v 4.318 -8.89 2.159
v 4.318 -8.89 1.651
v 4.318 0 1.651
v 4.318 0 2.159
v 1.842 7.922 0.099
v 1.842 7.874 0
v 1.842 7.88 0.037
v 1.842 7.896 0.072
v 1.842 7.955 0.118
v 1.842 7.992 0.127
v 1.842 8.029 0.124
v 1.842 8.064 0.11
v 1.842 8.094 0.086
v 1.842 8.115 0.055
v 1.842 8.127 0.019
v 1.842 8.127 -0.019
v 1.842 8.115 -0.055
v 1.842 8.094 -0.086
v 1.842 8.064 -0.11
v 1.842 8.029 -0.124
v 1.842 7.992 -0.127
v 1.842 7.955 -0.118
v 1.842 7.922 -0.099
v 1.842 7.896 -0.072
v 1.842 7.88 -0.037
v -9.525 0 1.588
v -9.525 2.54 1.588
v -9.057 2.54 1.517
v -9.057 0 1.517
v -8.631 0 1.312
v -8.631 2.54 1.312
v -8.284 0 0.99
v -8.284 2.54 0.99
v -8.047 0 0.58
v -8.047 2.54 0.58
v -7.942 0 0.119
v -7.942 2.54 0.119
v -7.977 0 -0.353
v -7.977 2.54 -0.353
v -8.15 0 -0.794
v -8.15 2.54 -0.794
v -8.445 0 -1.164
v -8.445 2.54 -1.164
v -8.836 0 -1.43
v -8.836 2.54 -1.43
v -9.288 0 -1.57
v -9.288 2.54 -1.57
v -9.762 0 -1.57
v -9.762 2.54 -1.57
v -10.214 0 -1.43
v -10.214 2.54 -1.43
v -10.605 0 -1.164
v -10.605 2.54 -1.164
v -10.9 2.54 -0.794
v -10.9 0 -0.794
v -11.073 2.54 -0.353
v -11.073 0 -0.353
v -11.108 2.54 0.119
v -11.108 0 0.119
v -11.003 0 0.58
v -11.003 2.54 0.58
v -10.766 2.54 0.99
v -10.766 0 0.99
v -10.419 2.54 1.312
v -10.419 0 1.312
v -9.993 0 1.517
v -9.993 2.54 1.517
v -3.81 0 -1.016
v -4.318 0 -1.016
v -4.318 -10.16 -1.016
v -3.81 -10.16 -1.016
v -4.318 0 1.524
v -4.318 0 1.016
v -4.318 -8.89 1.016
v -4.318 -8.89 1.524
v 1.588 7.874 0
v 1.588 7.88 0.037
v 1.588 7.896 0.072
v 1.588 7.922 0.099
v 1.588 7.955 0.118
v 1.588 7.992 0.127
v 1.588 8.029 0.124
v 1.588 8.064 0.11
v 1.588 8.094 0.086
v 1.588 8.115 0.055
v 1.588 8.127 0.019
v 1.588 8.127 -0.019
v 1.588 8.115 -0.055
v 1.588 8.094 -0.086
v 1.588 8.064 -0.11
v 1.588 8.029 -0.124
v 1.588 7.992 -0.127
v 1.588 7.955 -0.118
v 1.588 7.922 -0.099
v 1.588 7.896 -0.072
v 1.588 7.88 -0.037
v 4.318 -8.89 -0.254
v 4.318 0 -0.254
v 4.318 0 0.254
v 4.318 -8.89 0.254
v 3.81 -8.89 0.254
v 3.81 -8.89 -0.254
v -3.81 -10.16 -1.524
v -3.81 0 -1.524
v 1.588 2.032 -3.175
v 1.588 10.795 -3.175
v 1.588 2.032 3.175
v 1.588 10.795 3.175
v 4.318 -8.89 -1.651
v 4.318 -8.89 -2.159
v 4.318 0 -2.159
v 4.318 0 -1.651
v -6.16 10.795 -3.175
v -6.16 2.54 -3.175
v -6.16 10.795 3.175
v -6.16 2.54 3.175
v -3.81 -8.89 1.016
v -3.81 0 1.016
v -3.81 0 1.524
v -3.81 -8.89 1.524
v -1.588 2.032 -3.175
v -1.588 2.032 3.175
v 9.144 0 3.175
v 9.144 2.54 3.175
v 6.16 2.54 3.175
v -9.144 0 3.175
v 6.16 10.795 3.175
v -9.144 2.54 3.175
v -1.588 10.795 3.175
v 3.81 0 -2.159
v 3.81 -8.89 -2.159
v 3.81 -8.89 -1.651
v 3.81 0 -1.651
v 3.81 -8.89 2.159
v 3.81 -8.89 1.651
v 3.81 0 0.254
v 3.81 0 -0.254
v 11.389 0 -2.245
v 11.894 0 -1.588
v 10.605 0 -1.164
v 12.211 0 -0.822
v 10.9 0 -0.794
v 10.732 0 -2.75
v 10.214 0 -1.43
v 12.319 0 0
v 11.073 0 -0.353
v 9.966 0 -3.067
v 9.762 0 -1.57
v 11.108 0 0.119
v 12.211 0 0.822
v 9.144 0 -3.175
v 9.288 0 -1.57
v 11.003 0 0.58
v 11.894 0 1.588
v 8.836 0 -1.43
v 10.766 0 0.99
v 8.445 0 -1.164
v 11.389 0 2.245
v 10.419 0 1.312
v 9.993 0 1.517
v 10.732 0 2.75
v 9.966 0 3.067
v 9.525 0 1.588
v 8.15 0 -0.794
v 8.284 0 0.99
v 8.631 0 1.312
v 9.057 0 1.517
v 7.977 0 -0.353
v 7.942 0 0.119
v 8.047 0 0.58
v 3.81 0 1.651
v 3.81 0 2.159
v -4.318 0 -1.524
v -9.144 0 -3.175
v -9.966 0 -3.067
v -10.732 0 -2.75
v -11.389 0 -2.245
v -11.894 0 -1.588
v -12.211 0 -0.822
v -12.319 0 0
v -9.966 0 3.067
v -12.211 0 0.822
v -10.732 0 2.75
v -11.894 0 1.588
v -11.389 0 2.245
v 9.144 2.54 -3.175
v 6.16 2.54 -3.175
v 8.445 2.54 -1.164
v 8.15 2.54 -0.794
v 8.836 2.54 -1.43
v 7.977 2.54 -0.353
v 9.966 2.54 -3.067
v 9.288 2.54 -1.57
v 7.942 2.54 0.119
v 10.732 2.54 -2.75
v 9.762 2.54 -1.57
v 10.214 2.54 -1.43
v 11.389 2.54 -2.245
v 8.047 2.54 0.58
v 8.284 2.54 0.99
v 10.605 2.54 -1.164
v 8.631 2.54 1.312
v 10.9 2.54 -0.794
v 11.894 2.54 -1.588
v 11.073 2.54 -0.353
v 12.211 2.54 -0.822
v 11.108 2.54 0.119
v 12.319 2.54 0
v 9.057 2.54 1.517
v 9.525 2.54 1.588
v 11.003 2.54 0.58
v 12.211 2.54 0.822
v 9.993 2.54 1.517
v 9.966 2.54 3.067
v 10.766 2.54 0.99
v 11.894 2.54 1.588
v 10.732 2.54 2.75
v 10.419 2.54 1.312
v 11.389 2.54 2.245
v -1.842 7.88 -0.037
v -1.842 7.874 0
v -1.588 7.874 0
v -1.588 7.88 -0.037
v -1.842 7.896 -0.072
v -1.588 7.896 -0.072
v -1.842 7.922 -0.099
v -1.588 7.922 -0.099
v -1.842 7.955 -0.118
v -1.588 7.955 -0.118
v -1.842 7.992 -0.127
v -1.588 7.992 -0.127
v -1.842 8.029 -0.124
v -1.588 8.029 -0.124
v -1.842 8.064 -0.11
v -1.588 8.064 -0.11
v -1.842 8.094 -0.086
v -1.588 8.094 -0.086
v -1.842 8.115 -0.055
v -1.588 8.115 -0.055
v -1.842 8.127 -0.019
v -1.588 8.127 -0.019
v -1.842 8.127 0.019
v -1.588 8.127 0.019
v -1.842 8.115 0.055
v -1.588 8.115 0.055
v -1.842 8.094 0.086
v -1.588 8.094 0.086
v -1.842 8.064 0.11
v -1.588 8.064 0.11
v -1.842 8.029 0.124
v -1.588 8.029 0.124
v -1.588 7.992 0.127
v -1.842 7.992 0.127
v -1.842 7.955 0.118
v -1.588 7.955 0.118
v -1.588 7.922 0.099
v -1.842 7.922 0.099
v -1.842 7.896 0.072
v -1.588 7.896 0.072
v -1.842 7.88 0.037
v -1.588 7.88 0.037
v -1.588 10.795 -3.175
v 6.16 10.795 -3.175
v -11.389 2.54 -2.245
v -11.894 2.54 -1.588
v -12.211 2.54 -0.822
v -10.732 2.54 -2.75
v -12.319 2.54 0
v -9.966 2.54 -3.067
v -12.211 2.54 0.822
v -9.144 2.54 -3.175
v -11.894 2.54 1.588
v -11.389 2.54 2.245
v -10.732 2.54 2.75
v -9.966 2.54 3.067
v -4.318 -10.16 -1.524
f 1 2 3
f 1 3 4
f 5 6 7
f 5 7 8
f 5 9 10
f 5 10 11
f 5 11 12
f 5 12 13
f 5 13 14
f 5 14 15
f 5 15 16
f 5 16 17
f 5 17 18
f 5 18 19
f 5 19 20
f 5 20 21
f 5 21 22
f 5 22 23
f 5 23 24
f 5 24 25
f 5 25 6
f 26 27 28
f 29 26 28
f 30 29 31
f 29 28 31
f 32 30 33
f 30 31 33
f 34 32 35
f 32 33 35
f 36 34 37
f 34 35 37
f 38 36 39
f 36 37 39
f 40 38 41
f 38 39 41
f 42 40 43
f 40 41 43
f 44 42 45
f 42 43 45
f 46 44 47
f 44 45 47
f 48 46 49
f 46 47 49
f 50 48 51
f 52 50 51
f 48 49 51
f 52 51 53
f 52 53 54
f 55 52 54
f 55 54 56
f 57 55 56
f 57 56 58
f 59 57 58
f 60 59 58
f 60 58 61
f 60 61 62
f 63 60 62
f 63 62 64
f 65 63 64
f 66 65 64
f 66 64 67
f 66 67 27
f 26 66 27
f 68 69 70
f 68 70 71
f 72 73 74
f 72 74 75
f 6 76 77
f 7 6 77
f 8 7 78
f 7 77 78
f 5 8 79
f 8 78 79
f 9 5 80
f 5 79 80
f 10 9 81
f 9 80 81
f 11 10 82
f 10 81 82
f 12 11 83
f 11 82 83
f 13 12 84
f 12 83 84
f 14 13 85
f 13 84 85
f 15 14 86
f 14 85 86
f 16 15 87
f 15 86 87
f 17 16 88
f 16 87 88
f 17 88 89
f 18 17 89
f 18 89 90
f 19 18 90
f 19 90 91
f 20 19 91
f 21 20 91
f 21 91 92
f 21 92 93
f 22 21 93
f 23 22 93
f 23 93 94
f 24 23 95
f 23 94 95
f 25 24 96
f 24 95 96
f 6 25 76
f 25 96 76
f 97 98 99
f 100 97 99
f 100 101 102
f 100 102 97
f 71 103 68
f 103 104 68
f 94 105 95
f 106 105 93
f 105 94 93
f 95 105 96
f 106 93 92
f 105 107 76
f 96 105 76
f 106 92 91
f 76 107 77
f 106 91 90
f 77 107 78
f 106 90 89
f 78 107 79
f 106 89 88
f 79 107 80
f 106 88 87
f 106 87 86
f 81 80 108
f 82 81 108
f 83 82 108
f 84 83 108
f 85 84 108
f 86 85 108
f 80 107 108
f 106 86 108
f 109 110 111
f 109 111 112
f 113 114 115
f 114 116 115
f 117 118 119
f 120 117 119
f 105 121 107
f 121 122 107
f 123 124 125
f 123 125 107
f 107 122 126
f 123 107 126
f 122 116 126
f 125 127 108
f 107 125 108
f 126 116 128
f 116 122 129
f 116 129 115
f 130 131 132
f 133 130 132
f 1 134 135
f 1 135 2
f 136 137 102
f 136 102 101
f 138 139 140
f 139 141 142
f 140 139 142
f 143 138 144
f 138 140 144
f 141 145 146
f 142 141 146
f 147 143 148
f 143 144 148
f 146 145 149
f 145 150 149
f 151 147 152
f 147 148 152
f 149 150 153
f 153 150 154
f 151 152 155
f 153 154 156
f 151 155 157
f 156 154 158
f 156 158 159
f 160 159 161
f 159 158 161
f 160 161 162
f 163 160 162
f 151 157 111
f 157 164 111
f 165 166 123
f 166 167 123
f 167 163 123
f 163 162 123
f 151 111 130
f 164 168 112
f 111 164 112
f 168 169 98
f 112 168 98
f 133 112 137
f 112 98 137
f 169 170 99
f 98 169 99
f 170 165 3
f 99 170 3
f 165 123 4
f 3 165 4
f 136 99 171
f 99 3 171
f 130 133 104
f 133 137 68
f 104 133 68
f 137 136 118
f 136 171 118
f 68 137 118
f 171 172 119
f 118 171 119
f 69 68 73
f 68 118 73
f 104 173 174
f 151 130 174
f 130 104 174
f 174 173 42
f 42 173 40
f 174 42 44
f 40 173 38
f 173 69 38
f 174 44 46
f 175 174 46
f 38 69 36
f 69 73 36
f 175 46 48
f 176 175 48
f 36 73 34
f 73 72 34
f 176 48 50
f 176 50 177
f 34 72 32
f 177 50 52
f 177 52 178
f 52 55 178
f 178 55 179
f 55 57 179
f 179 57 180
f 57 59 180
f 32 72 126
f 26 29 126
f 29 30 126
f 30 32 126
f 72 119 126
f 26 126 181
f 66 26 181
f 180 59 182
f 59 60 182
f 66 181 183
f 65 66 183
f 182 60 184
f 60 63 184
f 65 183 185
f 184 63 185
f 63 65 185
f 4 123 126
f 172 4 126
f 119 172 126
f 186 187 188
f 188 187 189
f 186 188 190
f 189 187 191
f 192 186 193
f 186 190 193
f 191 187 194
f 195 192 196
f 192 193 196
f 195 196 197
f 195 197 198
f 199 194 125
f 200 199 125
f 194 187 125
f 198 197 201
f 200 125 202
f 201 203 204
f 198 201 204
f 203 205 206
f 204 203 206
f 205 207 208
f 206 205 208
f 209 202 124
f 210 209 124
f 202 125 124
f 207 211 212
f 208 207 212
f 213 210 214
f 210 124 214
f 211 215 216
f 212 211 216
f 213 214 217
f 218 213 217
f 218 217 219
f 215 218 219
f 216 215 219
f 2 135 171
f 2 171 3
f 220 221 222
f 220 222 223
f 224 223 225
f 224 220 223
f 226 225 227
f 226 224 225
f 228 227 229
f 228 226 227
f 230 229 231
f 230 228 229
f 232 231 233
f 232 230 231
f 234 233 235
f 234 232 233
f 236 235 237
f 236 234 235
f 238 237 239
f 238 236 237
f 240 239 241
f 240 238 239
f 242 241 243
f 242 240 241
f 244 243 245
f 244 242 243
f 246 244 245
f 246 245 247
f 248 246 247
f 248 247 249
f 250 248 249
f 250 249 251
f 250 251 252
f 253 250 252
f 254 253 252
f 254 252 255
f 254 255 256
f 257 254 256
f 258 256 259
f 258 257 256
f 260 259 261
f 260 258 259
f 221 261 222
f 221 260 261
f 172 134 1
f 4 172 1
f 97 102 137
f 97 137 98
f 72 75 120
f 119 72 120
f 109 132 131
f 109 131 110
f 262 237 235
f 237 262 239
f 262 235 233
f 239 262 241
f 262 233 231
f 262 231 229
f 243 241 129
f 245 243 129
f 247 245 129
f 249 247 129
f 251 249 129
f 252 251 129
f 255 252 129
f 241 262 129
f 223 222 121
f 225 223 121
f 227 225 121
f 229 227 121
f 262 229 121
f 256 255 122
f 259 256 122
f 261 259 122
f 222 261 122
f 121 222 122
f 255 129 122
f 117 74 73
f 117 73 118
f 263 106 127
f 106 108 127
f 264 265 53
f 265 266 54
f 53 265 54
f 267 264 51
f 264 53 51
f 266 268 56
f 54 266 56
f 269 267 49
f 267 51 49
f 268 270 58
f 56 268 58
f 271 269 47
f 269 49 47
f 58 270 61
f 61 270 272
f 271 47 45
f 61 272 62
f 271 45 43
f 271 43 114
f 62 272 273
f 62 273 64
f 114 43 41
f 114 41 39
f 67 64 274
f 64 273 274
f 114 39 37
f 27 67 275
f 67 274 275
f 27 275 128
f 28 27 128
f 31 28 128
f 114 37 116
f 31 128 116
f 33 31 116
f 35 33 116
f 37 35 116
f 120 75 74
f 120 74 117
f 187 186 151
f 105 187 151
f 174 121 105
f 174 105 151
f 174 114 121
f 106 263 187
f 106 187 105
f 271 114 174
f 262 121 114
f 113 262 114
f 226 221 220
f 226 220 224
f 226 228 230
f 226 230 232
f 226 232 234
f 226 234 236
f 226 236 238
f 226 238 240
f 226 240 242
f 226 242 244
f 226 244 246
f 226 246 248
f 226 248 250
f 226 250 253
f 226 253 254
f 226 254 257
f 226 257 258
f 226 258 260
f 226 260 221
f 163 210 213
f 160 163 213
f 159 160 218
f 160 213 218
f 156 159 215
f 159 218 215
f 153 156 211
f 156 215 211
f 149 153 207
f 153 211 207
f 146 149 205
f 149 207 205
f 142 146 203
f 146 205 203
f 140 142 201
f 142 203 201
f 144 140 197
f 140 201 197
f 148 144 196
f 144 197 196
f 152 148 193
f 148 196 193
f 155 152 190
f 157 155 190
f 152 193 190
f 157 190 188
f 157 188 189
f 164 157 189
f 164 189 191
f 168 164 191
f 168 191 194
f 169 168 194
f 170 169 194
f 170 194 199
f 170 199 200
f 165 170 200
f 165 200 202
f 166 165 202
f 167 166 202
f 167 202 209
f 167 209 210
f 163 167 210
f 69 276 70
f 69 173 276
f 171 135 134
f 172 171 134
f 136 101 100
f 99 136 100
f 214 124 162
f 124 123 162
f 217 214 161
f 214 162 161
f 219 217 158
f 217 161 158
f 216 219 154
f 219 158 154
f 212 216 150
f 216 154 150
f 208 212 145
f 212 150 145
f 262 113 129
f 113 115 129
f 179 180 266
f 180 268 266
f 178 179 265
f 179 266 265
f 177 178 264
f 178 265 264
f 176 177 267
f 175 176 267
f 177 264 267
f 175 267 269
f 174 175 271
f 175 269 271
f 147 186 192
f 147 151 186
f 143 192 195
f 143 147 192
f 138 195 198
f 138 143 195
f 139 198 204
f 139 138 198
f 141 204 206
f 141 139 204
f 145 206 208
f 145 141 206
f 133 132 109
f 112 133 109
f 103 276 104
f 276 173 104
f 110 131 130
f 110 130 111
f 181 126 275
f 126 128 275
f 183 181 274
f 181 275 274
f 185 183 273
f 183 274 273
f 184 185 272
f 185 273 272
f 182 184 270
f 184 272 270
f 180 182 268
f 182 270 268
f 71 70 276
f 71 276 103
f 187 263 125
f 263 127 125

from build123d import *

# Parameters (mm, degrees)
BOSS_EXTRUDE1_DEPTH = 3.175
FILLET1_R           = 3.175
SKETCH2_R           = 1.5875
CUT_EXTRUDE1_DEPTH  = 16.165203955
SKETCH3_R           = 0.127
CUT_EXTRUDE2_DEPTH  = 0.254
CUT_EXTRUDE3_START  = -0.254
SKETCH4_R           = 0.127
CUT_EXTRUDE3_DEPTH  = 0.254
SKETCH5_W           = 0.508
SKETCH5_H           = 0.508
BOSS_EXTRUDE2_DEPTH = 8.89
SKETCH6_W           = 0.508
SKETCH6_H           = 0.508
BOSS_EXTRUDE3_DEPTH = 1.27


with BuildPart() as part:
    # Sketch1 → Boss-Extrude1 (new, symmetric)
    with BuildSketch(Plane.XY):
        Polygon((12.319, 0), (-12.319, 0), (-12.319, 2.54), (-6.1595, 2.54), (-6.1595, 10.795), (-1.5875, 10.795), (-1.5875, 2.032), (1.5875, 2.032), (1.5875, 10.795), (6.1595, 10.795), (6.1595, 2.54), (12.319, 2.54), align=None)
    extrude(amount=BOSS_EXTRUDE1_DEPTH, both=True)

    # Fillet1
    fillet1_edges = [part.edges().sort_by_distance(p)[0] for p in [
        (-12.319, 1.27, 3.175),
        (-12.319, 1.27, -3.175),
        (12.319, 1.27, -3.175),
        (12.319, 1.27, 3.175),
    ]]
    fillet(fillet1_edges, radius=FILLET1_R - 0.0001)  # a hair under: the kernel refuses the full size

    # Sketch2 → Cut-Extrude1 (cut, through all)
    with BuildSketch(Plane(origin=(0, 2.54, 0), x_dir=(1, 0, 0), z_dir=(0, 1, 0))):
        with Locations(Location((-9.525, 0, 0), (0, 0, 270))):
            Circle(SKETCH2_R)
        with Locations(Location((9.525, 0, 0), (0, 0, 270))):
            Circle(SKETCH2_R)
    extrude(amount=-CUT_EXTRUDE1_DEPTH, mode=Mode.SUBTRACT)

    # Sketch3 → Cut-Extrude2 (cut)
    with BuildSketch(Plane.ZY.offset(-1.5875)):
        with Locations(Location((0, 8.001, 0), (0, 0, 270))):
            Circle(SKETCH3_R)
    extrude(amount=-CUT_EXTRUDE2_DEPTH, mode=Mode.SUBTRACT)

    # Sketch4 → Cut-Extrude3 (cut)
    with BuildSketch(Plane(origin=(-1.5875, 0, 0), x_dir=(0, 0, -1), z_dir=(1, 0, 0)).offset(CUT_EXTRUDE3_START)):
        with Locations(Location((0, 8.001, 0), (0, 0, 270))):
            Circle(SKETCH4_R)
    extrude(amount=CUT_EXTRUDE3_DEPTH, mode=Mode.SUBTRACT)

    # Sketch5 → Boss-Extrude2 (add)
    with BuildSketch(Plane.XZ):
        with Locations((-4.064, 1.27)):
            Rectangle(SKETCH5_W, SKETCH5_H)
        with Locations((-4.064, -1.27)):
            Rectangle(SKETCH5_W, SKETCH5_H)
        with Locations((4.064, 1.905)):
            Rectangle(SKETCH5_W, SKETCH5_H)
        with Locations((4.064, 0)):
            Rectangle(SKETCH5_W, SKETCH5_H)
        with Locations((4.064, -1.905)):
            Rectangle(SKETCH5_W, SKETCH5_H)
    extrude(amount=BOSS_EXTRUDE2_DEPTH)

    # Sketch6 → Boss-Extrude3 (add)
    with BuildSketch(Plane.XZ.offset(8.89)):
        with Locations((-4.064, -1.27)):
            Rectangle(SKETCH6_W, SKETCH6_H)
    extrude(amount=BOSS_EXTRUDE3_DEPTH)


solid = part.part
